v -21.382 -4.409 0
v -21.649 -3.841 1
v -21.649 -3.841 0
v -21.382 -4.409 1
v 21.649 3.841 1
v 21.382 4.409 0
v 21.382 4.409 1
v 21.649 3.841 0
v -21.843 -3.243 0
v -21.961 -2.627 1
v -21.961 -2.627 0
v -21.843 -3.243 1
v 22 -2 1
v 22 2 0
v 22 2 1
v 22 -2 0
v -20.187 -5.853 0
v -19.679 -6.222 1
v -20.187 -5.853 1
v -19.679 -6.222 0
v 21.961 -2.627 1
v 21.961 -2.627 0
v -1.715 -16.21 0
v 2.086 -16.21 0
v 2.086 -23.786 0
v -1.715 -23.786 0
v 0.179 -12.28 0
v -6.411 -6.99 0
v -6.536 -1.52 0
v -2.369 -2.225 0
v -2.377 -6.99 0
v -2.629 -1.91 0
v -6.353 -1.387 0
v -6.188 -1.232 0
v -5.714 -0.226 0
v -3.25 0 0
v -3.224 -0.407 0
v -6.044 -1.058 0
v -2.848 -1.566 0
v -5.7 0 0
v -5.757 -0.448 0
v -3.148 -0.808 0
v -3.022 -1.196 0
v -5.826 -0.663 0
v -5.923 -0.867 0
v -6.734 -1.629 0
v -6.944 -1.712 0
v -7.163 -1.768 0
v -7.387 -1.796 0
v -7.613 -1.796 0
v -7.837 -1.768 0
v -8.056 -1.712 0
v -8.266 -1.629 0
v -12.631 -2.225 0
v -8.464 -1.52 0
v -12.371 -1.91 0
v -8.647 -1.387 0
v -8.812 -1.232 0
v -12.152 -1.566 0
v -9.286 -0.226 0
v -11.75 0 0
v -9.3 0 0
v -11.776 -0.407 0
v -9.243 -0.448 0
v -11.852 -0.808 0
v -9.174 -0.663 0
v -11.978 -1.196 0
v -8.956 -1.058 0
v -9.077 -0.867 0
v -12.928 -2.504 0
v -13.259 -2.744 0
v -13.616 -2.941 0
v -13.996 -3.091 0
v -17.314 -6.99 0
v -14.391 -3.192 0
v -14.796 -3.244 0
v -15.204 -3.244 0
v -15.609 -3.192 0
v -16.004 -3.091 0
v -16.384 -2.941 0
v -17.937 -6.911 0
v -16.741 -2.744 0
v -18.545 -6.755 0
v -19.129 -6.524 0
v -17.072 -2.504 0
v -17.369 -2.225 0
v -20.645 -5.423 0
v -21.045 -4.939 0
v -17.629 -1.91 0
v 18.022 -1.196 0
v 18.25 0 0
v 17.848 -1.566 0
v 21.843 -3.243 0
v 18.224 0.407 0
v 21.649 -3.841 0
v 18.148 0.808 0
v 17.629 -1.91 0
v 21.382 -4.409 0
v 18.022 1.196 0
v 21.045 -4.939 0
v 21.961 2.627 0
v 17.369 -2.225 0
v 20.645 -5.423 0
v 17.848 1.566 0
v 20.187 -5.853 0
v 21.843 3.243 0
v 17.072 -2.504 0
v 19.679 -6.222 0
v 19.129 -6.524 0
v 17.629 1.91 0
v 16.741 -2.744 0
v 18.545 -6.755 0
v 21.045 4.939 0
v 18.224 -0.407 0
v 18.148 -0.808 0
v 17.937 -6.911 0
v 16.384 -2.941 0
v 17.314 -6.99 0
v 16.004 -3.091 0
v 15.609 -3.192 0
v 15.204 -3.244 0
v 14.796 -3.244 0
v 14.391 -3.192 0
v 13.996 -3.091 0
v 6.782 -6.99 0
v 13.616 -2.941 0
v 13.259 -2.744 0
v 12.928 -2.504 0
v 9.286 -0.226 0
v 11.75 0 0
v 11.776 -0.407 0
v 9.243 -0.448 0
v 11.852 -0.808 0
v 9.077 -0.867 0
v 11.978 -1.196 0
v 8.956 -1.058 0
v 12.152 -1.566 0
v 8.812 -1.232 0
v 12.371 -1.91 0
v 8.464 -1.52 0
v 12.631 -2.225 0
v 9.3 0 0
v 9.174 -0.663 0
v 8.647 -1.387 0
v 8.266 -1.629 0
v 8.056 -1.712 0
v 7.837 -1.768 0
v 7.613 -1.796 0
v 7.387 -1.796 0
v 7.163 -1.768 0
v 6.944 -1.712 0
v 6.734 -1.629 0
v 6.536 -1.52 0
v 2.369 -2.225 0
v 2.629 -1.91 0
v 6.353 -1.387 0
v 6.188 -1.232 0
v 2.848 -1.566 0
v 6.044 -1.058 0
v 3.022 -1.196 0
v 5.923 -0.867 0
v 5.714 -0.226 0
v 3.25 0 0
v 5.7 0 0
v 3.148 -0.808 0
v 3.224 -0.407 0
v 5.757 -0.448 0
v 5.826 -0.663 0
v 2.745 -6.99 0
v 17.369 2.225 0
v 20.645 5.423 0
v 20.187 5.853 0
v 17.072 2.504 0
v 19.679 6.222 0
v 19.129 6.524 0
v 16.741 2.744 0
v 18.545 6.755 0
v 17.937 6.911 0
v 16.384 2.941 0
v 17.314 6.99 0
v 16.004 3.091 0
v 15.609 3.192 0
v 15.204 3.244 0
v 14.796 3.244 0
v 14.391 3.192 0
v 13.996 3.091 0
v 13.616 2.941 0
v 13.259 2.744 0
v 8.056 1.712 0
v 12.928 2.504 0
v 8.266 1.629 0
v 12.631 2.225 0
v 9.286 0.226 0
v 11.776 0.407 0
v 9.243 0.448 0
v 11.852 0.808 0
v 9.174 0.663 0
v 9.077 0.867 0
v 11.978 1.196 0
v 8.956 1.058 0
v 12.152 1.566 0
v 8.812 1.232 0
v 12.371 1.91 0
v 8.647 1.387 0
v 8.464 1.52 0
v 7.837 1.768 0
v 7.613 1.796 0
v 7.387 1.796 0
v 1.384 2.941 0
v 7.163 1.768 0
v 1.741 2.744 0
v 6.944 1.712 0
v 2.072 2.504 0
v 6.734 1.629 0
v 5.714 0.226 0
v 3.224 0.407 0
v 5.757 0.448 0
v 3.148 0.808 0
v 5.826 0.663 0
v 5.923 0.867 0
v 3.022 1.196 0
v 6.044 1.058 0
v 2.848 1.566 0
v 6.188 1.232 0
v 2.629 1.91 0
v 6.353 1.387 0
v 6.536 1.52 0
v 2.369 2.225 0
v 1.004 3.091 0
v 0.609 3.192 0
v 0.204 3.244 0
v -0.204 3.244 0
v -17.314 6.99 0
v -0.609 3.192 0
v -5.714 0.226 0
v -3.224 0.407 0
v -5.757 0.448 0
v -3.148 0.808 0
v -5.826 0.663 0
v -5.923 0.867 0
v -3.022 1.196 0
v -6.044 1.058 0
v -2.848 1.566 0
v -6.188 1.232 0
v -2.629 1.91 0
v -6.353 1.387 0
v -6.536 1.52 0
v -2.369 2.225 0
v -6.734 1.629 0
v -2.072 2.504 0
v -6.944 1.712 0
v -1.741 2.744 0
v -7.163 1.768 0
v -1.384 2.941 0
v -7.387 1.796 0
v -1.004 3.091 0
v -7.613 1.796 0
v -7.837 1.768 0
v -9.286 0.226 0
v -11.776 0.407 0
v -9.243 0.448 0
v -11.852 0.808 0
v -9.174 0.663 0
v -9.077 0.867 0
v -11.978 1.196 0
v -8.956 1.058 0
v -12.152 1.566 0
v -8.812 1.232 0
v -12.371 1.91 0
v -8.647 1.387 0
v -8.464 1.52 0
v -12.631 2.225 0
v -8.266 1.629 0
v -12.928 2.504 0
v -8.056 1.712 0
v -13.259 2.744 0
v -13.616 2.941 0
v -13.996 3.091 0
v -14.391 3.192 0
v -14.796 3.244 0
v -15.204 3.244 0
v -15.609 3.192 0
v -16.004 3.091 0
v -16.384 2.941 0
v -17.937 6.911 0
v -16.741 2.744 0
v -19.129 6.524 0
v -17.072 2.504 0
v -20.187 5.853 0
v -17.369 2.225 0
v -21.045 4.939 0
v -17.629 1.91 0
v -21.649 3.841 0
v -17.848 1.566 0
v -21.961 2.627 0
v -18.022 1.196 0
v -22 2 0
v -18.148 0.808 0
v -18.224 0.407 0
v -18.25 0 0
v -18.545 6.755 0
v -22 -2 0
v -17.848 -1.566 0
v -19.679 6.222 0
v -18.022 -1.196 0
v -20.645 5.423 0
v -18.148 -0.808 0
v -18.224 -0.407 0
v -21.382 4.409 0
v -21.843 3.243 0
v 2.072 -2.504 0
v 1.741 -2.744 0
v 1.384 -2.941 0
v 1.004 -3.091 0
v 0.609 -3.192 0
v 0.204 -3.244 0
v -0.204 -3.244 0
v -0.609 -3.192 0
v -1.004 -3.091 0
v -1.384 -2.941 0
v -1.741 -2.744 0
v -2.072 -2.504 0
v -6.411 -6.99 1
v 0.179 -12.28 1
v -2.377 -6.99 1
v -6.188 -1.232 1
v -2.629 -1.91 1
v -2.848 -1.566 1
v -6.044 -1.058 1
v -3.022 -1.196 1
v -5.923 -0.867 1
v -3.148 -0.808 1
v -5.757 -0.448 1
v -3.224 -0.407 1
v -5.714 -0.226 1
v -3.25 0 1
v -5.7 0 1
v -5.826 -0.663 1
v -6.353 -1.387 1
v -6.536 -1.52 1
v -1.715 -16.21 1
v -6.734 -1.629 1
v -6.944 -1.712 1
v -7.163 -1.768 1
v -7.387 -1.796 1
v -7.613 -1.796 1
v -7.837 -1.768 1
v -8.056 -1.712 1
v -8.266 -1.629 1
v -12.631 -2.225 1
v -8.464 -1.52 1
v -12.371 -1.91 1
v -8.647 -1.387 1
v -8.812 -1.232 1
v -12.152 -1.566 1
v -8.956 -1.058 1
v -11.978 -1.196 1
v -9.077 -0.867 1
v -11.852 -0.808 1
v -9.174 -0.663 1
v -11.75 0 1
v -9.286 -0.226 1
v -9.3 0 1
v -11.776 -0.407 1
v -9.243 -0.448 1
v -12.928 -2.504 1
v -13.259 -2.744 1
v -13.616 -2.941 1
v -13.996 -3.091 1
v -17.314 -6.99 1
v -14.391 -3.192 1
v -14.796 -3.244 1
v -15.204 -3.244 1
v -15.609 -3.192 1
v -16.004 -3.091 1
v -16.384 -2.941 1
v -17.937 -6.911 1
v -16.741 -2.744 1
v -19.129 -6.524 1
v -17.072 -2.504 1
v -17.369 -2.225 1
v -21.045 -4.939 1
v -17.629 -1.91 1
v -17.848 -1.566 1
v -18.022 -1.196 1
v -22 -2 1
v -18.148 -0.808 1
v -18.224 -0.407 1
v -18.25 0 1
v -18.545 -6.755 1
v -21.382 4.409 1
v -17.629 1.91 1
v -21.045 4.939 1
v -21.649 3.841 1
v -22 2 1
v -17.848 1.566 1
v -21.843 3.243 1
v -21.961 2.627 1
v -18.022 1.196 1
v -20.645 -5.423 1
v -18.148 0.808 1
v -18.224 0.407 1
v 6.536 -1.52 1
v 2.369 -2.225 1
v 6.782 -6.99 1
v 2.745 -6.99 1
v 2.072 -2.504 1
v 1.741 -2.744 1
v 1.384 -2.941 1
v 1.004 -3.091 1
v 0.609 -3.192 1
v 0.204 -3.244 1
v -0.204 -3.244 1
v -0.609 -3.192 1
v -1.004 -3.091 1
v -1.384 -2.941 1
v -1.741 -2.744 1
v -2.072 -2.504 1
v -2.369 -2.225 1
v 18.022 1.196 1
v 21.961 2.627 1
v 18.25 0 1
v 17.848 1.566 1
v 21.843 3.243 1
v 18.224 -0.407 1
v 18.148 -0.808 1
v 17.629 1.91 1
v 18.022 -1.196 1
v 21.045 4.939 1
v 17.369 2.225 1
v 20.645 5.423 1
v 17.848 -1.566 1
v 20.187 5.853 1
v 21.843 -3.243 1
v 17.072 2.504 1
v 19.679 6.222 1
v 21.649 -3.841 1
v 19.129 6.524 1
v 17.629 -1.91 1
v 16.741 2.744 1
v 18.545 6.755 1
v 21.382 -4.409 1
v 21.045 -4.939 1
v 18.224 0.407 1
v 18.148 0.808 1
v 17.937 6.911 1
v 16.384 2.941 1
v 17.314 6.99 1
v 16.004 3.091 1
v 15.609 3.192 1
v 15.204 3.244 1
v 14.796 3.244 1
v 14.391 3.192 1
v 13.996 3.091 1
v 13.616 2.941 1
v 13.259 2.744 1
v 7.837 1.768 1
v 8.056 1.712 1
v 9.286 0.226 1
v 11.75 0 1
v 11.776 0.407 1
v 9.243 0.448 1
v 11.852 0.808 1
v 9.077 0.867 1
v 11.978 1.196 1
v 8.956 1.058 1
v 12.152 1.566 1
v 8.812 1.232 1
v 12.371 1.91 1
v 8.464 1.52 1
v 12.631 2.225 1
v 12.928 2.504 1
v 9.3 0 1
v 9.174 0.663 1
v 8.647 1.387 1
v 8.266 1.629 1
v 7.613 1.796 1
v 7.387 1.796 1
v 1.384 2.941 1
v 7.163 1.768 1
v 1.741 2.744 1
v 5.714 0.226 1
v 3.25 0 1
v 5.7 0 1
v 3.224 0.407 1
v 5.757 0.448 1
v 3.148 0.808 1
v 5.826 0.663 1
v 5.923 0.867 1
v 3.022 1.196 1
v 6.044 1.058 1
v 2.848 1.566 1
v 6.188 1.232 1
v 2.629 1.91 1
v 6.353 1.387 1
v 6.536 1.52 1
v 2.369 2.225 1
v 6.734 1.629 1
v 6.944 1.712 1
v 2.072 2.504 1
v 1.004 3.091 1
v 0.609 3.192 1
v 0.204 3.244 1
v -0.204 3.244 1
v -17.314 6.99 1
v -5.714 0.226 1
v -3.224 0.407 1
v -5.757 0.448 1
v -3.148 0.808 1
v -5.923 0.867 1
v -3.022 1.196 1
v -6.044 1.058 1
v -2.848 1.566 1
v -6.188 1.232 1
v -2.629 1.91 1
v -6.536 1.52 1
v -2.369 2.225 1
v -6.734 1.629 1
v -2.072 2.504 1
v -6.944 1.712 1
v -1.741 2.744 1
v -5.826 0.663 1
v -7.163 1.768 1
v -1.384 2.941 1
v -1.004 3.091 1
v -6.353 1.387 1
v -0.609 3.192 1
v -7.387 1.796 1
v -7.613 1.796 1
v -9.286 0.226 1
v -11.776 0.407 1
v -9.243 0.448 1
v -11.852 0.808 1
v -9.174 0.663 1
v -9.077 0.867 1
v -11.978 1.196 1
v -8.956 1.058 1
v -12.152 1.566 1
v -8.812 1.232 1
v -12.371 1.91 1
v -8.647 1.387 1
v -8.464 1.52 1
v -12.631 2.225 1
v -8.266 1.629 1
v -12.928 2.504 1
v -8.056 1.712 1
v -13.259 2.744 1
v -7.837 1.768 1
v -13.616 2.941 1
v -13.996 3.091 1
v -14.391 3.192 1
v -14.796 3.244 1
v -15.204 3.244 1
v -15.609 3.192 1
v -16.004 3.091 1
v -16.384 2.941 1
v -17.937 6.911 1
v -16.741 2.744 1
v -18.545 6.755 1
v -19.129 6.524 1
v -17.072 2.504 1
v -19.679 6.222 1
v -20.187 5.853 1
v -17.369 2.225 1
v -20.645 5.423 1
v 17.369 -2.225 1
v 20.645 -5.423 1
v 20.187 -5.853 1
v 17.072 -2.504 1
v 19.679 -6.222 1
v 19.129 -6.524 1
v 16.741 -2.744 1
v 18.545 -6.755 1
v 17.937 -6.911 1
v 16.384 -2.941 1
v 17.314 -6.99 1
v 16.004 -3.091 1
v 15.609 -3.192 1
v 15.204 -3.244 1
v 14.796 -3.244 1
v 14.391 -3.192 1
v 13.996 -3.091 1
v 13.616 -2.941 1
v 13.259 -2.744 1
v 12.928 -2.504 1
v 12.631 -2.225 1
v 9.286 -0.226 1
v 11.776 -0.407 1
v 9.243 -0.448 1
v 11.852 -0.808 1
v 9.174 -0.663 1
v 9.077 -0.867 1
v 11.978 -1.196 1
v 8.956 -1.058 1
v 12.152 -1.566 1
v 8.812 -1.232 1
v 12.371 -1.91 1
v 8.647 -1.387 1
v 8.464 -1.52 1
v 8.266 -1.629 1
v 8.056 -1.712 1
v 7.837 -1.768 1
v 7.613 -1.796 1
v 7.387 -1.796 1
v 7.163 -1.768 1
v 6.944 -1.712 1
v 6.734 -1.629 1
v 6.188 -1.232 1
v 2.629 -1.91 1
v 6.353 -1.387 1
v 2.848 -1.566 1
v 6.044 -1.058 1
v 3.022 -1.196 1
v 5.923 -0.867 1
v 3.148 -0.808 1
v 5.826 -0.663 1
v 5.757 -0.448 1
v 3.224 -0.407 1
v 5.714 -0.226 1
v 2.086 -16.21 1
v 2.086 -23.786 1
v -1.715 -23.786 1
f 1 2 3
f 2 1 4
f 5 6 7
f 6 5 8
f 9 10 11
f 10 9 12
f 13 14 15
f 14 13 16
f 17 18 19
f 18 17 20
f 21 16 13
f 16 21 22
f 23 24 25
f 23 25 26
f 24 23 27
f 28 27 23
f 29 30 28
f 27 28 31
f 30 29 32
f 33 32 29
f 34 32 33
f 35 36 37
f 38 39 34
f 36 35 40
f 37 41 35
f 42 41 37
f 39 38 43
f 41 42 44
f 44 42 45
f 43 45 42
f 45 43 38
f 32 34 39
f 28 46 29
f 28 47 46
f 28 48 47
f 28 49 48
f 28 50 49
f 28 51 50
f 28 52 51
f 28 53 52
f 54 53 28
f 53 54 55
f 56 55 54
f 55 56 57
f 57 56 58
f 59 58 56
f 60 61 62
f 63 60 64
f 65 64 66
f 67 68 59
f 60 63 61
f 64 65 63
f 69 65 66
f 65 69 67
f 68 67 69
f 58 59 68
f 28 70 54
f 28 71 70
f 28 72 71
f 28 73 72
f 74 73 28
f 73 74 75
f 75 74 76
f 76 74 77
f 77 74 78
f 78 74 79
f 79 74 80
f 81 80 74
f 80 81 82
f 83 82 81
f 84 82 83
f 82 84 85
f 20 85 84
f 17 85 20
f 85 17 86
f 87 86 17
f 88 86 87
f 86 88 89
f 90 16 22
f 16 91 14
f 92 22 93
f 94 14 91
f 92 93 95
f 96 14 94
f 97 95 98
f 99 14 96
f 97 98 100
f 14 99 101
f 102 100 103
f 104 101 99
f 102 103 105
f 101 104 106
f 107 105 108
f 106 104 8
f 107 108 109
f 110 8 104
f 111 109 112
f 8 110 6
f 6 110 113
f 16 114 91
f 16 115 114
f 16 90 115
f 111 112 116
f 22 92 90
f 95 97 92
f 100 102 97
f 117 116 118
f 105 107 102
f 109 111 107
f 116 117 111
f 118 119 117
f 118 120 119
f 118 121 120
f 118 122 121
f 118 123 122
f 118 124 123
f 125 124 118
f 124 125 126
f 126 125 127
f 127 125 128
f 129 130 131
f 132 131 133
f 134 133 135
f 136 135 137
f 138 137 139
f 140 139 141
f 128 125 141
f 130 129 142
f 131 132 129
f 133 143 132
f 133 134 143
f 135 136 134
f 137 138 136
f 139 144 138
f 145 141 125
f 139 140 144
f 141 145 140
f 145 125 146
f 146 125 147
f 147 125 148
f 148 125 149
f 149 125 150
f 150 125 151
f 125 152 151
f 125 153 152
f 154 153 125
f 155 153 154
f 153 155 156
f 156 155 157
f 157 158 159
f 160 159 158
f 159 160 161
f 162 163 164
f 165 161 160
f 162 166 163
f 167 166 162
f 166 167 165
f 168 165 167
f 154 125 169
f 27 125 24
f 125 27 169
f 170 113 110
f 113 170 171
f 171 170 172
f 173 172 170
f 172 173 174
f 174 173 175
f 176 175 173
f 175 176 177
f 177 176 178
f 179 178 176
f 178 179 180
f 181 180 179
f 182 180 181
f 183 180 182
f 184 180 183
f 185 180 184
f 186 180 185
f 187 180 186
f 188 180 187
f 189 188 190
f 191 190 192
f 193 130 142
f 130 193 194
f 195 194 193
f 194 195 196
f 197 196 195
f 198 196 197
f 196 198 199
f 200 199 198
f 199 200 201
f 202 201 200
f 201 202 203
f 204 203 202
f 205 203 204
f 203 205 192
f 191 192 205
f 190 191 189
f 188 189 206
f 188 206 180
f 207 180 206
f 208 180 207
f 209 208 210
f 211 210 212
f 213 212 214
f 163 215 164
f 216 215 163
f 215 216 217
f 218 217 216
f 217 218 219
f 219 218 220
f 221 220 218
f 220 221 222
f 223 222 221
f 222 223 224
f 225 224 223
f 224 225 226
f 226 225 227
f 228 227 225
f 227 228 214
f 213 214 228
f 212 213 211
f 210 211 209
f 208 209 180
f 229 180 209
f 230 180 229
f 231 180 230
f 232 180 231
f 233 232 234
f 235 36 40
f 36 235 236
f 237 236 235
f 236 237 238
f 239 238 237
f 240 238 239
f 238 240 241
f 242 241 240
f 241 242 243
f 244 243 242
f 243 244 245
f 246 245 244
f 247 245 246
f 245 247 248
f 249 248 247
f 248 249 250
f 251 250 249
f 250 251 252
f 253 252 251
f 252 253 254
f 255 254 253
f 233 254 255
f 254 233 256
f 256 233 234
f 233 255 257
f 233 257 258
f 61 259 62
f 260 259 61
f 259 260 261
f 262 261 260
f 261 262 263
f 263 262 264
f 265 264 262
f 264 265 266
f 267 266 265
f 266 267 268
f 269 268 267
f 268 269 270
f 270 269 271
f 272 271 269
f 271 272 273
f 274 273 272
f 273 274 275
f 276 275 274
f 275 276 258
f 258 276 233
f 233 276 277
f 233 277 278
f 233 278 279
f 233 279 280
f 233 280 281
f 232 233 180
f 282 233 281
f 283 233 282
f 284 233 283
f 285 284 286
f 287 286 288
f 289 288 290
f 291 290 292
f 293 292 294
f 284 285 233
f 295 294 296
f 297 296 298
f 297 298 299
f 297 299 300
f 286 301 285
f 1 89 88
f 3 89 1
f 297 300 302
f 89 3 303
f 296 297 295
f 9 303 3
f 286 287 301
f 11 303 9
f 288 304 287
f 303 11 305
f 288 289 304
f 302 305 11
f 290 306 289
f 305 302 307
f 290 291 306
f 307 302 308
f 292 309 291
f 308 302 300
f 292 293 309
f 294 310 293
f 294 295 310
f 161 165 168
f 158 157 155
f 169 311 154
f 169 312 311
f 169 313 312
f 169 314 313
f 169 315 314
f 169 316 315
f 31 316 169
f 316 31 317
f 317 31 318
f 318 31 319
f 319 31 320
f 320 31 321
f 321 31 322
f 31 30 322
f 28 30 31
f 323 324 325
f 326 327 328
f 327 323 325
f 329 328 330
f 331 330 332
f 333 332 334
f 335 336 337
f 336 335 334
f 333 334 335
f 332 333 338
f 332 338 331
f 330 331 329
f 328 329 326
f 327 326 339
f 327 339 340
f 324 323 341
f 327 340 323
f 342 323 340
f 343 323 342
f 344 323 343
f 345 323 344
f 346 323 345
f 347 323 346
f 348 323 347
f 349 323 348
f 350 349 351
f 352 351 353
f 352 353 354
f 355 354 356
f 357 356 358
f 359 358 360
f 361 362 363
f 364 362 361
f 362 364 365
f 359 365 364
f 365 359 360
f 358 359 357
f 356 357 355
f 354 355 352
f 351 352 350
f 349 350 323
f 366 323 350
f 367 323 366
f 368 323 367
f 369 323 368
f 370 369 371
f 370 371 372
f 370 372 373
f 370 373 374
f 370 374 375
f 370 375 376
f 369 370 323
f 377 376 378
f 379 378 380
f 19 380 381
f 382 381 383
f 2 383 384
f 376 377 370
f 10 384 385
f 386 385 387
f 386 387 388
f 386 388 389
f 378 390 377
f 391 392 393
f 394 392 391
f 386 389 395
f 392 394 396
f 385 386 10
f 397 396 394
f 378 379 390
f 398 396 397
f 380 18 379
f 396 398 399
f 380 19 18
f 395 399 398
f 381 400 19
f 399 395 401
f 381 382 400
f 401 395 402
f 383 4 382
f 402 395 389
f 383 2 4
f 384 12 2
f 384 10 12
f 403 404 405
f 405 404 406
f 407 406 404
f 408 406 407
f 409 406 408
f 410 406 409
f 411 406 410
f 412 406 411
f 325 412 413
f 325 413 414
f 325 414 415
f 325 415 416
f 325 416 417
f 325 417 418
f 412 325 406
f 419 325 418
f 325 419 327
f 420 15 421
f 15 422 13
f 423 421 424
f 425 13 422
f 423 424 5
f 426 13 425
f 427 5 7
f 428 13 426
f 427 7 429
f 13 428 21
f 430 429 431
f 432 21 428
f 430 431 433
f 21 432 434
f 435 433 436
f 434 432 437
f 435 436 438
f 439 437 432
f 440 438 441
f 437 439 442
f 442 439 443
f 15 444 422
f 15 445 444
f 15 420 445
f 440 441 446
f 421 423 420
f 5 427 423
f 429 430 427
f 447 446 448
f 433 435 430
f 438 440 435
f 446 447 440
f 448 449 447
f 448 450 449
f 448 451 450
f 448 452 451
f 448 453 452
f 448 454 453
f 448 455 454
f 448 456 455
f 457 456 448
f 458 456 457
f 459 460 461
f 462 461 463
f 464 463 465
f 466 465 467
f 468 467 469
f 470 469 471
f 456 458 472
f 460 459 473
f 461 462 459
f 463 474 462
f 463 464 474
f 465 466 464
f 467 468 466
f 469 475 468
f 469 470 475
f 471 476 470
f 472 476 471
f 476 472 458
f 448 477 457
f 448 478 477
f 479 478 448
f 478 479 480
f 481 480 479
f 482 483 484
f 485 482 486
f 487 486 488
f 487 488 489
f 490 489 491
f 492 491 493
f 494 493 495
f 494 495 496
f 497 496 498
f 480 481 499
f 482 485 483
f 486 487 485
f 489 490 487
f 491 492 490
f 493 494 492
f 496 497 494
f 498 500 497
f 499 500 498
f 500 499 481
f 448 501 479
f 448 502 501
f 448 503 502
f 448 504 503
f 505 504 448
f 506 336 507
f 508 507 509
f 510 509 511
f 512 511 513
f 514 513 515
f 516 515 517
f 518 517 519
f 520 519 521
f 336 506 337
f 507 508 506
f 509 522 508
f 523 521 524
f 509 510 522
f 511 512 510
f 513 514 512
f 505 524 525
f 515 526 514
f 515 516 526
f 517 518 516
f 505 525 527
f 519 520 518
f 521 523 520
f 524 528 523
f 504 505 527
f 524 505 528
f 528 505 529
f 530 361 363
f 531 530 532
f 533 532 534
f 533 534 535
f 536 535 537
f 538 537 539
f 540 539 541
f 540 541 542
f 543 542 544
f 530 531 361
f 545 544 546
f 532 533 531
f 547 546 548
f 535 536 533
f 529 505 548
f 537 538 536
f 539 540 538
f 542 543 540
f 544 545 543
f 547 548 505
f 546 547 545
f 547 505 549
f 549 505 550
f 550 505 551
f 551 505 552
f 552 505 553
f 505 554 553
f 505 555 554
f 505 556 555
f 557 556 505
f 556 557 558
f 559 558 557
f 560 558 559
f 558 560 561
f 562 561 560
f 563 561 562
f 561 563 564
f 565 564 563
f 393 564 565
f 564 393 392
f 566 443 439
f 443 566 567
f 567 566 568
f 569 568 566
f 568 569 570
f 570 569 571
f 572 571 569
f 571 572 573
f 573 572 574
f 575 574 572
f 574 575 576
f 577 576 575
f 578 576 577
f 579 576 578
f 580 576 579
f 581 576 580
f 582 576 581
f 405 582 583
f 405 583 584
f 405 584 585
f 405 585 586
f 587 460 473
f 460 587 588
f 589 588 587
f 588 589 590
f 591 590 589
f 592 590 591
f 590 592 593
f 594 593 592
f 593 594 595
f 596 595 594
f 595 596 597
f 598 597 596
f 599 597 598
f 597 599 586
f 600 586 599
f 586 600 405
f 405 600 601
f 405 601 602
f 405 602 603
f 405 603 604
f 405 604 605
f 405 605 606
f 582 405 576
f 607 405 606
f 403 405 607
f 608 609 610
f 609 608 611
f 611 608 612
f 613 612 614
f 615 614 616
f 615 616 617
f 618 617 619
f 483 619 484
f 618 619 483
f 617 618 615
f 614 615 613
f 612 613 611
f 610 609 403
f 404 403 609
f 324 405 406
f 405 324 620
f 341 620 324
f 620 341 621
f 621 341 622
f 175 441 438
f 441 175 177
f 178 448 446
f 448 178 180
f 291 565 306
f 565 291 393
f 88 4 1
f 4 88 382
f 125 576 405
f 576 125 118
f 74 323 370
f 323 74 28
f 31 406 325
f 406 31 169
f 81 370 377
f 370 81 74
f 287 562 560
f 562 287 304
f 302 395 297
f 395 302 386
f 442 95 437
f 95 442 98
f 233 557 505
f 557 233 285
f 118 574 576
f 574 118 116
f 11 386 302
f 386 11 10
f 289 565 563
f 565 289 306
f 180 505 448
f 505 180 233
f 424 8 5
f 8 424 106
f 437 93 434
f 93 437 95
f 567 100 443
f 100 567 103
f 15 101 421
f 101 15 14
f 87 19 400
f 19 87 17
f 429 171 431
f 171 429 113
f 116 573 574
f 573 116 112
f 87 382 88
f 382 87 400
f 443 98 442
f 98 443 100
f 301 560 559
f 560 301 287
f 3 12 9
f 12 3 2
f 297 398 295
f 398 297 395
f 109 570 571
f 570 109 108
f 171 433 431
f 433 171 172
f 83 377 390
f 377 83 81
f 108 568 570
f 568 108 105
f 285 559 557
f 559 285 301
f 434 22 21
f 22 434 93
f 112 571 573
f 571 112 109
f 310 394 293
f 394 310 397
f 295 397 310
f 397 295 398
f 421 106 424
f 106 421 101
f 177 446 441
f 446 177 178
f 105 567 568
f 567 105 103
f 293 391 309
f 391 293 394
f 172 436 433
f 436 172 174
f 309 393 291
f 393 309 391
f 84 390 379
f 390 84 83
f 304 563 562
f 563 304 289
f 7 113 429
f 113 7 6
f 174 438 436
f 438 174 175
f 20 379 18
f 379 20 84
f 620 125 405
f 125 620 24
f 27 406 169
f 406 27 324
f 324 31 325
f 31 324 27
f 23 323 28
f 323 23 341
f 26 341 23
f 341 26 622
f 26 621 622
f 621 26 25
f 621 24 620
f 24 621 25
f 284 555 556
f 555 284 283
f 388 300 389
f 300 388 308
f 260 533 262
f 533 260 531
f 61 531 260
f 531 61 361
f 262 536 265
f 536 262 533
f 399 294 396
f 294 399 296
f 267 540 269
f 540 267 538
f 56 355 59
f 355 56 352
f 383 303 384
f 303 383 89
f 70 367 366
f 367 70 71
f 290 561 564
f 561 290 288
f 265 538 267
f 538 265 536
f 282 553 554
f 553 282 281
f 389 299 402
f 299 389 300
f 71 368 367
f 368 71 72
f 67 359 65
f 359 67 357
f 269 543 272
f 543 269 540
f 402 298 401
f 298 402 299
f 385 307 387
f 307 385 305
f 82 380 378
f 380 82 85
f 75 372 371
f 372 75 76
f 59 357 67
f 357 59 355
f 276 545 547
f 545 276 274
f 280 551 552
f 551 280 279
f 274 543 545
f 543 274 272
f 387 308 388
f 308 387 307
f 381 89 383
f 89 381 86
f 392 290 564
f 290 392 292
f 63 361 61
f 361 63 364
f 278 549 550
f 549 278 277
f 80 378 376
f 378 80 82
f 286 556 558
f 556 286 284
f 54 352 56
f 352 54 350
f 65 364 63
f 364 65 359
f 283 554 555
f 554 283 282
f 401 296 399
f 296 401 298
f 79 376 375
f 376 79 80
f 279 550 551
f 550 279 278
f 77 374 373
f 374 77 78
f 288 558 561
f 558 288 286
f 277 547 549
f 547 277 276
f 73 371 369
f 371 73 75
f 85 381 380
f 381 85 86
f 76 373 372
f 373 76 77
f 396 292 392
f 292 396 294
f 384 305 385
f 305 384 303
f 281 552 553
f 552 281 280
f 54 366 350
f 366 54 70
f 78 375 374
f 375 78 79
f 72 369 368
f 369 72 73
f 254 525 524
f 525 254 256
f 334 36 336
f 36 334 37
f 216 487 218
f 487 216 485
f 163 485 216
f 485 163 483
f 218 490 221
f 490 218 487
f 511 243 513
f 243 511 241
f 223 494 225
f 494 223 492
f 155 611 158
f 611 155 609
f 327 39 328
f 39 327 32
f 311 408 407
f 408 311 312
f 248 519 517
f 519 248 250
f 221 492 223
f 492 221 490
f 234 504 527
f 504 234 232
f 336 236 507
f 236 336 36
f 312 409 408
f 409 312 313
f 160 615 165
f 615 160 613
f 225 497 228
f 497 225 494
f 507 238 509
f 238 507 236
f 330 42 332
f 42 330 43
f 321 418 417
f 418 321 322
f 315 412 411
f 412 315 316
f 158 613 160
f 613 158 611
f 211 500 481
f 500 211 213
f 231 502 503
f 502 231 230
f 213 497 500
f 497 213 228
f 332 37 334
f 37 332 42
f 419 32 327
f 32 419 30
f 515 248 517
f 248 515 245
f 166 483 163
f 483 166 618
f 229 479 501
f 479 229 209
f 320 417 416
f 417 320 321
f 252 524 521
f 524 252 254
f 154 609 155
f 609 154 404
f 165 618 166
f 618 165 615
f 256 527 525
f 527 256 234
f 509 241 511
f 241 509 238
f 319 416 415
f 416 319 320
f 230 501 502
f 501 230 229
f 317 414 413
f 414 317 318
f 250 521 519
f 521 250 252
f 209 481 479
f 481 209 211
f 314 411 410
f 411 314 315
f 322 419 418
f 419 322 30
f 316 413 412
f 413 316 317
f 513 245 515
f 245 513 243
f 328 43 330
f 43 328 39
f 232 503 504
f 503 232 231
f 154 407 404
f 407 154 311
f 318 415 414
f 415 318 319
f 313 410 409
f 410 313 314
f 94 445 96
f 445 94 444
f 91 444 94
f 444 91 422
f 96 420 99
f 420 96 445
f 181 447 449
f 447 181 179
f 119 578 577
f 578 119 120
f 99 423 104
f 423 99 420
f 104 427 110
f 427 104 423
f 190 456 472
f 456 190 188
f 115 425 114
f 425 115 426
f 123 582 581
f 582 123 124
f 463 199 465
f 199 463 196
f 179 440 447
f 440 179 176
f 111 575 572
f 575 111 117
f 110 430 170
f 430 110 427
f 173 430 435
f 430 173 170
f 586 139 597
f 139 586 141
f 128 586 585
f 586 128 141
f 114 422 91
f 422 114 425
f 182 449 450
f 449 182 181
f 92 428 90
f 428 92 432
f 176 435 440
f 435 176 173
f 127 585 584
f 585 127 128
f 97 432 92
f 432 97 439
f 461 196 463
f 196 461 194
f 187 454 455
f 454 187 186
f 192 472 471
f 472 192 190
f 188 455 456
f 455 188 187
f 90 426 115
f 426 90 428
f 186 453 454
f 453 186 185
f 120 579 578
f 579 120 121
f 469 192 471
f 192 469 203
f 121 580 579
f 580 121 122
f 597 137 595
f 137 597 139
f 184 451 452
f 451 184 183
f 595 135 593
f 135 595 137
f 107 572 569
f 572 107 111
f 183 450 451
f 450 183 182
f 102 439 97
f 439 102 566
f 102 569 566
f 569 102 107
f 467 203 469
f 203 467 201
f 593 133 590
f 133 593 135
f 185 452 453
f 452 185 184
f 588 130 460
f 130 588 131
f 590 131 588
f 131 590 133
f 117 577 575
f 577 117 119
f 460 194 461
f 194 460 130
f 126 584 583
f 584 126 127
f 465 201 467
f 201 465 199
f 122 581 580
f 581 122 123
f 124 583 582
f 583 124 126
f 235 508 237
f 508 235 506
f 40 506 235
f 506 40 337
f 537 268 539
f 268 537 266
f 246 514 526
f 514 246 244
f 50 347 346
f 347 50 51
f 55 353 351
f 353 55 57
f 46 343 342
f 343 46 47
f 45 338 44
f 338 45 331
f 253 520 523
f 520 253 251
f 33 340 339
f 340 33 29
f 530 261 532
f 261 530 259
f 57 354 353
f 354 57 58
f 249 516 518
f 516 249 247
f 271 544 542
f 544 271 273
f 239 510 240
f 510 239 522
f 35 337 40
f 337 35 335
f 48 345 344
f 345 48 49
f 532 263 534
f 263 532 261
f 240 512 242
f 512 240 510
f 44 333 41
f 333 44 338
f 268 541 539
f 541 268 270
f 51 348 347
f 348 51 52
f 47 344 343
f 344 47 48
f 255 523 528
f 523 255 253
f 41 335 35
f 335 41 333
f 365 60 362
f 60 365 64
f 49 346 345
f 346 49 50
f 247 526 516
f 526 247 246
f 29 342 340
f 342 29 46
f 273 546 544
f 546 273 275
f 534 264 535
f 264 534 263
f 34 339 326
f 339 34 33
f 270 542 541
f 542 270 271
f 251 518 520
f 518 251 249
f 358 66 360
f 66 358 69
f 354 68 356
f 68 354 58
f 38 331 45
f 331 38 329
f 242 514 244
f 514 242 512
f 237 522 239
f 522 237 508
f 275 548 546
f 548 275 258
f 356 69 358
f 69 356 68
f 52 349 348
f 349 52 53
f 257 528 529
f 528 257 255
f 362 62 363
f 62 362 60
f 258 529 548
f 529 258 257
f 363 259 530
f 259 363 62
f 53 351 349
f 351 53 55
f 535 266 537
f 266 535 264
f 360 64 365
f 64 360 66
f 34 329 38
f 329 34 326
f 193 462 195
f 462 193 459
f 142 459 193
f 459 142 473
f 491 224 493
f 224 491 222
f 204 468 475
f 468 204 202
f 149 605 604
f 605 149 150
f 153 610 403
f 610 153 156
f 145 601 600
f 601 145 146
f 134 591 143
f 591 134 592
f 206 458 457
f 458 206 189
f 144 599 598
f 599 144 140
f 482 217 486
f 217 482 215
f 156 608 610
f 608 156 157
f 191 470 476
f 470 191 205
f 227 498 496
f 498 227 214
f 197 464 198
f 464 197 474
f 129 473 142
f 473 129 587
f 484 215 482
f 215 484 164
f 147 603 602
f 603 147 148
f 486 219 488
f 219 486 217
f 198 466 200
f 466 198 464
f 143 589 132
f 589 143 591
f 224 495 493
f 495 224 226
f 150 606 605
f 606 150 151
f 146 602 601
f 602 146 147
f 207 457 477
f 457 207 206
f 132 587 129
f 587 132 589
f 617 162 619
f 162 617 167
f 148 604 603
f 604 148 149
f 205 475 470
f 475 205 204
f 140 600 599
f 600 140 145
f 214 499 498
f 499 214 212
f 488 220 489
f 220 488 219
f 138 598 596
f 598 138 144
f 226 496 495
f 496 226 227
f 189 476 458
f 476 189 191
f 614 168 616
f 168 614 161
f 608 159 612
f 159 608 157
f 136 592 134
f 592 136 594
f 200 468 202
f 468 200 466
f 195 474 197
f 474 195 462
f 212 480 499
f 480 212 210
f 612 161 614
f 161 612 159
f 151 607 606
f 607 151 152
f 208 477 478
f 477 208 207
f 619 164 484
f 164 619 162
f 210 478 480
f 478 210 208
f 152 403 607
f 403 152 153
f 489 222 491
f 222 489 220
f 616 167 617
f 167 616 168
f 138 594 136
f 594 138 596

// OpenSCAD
$fn = 50;


difference() {
	union() {
		*color(alpha = 1.0000000000, c = "gray") {
			translate(v = [0, 14, 0]) {
				linear_extrude(height = 1) {
					text(font = "Arial:style=Bold", halign = "center", size = 4.5000000000, text = "COMMENT description oobb_plate_shape_p_type_1_depth_3_width_1_thickness_y_extra_oobb_size", valign = "center");
				}
			}
		}
		hull() {
			translate(v = [-17.0000000000, 2.0000000000, 0]) {
				cylinder(h = 1, r = 5);
			}
			translate(v = [17.0000000000, 2.0000000000, 0]) {
				cylinder(h = 1, r = 5);
			}
			translate(v = [-17.0000000000, -2.0000000000, 0]) {
				cylinder(h = 1, r = 5);
			}
			translate(v = [17.0000000000, -2.0000000000, 0]) {
				cylinder(h = 1, r = 5);
			}
		}
		translate(v = [0, -5, 0]) {
			linear_extrude(height = 1) {
				text(font = "DejaVu Sans Mono:style=Bold", halign = "center", size = 19.0000000000, text = "Y", valign = "top");
			}
		}
	}
	union() {
		*color(alpha = 1.0000000000, c = "gray") {
			translate(v = [0, 14, 0]) {
				linear_extrude(height = 1) {
					text(font = "Arial:style=Bold", halign = "center", size = 4.5000000000, text = "COMMENT description oobb_holes_shape_n_type_3_width_1_thickness_y_extra_oobb_size_1_height_'all'_holes_true_both_holes", valign = "center");
				}
			}
		}
		translate(v = [-15.0000000000, 0.0000000000, 0]) {
			translate(v = [0, 0, -50]) {
				cylinder(h = 100, r = 3.2500000000);
			}
		}
		translate(v = [0, 0, -50]) {
			cylinder(h = 100, r = 3.2500000000);
		}
		translate(v = [15.0000000000, 0.0000000000, 0]) {
			translate(v = [0, 0, -50]) {
				cylinder(h = 100, r = 3.2500000000);
			}
		}
		translate(v = [-15.0000000000, 0.0000000000, 0]) {
			translate(v = [0, 0, -50]) {
				cylinder(h = 100, r = 1.8000000000);
			}
		}
		translate(v = [-7.5000000000, 0.0000000000, 0]) {
			translate(v = [0, 0, -50]) {
				cylinder(h = 100, r = 1.8000000000);
			}
		}
		translate(v = [0, 0, -50]) {
			cylinder(h = 100, r = 1.8000000000);
		}
		translate(v = [7.5000000000, 0.0000000000, 0]) {
			translate(v = [0, 0, -50]) {
				cylinder(h = 100, r = 1.8000000000);
			}
		}
		translate(v = [15.0000000000, 0.0000000000, 0]) {
			translate(v = [0, 0, -50]) {
				cylinder(h = 100, r = 1.8000000000);
			}
		}
	}
}
